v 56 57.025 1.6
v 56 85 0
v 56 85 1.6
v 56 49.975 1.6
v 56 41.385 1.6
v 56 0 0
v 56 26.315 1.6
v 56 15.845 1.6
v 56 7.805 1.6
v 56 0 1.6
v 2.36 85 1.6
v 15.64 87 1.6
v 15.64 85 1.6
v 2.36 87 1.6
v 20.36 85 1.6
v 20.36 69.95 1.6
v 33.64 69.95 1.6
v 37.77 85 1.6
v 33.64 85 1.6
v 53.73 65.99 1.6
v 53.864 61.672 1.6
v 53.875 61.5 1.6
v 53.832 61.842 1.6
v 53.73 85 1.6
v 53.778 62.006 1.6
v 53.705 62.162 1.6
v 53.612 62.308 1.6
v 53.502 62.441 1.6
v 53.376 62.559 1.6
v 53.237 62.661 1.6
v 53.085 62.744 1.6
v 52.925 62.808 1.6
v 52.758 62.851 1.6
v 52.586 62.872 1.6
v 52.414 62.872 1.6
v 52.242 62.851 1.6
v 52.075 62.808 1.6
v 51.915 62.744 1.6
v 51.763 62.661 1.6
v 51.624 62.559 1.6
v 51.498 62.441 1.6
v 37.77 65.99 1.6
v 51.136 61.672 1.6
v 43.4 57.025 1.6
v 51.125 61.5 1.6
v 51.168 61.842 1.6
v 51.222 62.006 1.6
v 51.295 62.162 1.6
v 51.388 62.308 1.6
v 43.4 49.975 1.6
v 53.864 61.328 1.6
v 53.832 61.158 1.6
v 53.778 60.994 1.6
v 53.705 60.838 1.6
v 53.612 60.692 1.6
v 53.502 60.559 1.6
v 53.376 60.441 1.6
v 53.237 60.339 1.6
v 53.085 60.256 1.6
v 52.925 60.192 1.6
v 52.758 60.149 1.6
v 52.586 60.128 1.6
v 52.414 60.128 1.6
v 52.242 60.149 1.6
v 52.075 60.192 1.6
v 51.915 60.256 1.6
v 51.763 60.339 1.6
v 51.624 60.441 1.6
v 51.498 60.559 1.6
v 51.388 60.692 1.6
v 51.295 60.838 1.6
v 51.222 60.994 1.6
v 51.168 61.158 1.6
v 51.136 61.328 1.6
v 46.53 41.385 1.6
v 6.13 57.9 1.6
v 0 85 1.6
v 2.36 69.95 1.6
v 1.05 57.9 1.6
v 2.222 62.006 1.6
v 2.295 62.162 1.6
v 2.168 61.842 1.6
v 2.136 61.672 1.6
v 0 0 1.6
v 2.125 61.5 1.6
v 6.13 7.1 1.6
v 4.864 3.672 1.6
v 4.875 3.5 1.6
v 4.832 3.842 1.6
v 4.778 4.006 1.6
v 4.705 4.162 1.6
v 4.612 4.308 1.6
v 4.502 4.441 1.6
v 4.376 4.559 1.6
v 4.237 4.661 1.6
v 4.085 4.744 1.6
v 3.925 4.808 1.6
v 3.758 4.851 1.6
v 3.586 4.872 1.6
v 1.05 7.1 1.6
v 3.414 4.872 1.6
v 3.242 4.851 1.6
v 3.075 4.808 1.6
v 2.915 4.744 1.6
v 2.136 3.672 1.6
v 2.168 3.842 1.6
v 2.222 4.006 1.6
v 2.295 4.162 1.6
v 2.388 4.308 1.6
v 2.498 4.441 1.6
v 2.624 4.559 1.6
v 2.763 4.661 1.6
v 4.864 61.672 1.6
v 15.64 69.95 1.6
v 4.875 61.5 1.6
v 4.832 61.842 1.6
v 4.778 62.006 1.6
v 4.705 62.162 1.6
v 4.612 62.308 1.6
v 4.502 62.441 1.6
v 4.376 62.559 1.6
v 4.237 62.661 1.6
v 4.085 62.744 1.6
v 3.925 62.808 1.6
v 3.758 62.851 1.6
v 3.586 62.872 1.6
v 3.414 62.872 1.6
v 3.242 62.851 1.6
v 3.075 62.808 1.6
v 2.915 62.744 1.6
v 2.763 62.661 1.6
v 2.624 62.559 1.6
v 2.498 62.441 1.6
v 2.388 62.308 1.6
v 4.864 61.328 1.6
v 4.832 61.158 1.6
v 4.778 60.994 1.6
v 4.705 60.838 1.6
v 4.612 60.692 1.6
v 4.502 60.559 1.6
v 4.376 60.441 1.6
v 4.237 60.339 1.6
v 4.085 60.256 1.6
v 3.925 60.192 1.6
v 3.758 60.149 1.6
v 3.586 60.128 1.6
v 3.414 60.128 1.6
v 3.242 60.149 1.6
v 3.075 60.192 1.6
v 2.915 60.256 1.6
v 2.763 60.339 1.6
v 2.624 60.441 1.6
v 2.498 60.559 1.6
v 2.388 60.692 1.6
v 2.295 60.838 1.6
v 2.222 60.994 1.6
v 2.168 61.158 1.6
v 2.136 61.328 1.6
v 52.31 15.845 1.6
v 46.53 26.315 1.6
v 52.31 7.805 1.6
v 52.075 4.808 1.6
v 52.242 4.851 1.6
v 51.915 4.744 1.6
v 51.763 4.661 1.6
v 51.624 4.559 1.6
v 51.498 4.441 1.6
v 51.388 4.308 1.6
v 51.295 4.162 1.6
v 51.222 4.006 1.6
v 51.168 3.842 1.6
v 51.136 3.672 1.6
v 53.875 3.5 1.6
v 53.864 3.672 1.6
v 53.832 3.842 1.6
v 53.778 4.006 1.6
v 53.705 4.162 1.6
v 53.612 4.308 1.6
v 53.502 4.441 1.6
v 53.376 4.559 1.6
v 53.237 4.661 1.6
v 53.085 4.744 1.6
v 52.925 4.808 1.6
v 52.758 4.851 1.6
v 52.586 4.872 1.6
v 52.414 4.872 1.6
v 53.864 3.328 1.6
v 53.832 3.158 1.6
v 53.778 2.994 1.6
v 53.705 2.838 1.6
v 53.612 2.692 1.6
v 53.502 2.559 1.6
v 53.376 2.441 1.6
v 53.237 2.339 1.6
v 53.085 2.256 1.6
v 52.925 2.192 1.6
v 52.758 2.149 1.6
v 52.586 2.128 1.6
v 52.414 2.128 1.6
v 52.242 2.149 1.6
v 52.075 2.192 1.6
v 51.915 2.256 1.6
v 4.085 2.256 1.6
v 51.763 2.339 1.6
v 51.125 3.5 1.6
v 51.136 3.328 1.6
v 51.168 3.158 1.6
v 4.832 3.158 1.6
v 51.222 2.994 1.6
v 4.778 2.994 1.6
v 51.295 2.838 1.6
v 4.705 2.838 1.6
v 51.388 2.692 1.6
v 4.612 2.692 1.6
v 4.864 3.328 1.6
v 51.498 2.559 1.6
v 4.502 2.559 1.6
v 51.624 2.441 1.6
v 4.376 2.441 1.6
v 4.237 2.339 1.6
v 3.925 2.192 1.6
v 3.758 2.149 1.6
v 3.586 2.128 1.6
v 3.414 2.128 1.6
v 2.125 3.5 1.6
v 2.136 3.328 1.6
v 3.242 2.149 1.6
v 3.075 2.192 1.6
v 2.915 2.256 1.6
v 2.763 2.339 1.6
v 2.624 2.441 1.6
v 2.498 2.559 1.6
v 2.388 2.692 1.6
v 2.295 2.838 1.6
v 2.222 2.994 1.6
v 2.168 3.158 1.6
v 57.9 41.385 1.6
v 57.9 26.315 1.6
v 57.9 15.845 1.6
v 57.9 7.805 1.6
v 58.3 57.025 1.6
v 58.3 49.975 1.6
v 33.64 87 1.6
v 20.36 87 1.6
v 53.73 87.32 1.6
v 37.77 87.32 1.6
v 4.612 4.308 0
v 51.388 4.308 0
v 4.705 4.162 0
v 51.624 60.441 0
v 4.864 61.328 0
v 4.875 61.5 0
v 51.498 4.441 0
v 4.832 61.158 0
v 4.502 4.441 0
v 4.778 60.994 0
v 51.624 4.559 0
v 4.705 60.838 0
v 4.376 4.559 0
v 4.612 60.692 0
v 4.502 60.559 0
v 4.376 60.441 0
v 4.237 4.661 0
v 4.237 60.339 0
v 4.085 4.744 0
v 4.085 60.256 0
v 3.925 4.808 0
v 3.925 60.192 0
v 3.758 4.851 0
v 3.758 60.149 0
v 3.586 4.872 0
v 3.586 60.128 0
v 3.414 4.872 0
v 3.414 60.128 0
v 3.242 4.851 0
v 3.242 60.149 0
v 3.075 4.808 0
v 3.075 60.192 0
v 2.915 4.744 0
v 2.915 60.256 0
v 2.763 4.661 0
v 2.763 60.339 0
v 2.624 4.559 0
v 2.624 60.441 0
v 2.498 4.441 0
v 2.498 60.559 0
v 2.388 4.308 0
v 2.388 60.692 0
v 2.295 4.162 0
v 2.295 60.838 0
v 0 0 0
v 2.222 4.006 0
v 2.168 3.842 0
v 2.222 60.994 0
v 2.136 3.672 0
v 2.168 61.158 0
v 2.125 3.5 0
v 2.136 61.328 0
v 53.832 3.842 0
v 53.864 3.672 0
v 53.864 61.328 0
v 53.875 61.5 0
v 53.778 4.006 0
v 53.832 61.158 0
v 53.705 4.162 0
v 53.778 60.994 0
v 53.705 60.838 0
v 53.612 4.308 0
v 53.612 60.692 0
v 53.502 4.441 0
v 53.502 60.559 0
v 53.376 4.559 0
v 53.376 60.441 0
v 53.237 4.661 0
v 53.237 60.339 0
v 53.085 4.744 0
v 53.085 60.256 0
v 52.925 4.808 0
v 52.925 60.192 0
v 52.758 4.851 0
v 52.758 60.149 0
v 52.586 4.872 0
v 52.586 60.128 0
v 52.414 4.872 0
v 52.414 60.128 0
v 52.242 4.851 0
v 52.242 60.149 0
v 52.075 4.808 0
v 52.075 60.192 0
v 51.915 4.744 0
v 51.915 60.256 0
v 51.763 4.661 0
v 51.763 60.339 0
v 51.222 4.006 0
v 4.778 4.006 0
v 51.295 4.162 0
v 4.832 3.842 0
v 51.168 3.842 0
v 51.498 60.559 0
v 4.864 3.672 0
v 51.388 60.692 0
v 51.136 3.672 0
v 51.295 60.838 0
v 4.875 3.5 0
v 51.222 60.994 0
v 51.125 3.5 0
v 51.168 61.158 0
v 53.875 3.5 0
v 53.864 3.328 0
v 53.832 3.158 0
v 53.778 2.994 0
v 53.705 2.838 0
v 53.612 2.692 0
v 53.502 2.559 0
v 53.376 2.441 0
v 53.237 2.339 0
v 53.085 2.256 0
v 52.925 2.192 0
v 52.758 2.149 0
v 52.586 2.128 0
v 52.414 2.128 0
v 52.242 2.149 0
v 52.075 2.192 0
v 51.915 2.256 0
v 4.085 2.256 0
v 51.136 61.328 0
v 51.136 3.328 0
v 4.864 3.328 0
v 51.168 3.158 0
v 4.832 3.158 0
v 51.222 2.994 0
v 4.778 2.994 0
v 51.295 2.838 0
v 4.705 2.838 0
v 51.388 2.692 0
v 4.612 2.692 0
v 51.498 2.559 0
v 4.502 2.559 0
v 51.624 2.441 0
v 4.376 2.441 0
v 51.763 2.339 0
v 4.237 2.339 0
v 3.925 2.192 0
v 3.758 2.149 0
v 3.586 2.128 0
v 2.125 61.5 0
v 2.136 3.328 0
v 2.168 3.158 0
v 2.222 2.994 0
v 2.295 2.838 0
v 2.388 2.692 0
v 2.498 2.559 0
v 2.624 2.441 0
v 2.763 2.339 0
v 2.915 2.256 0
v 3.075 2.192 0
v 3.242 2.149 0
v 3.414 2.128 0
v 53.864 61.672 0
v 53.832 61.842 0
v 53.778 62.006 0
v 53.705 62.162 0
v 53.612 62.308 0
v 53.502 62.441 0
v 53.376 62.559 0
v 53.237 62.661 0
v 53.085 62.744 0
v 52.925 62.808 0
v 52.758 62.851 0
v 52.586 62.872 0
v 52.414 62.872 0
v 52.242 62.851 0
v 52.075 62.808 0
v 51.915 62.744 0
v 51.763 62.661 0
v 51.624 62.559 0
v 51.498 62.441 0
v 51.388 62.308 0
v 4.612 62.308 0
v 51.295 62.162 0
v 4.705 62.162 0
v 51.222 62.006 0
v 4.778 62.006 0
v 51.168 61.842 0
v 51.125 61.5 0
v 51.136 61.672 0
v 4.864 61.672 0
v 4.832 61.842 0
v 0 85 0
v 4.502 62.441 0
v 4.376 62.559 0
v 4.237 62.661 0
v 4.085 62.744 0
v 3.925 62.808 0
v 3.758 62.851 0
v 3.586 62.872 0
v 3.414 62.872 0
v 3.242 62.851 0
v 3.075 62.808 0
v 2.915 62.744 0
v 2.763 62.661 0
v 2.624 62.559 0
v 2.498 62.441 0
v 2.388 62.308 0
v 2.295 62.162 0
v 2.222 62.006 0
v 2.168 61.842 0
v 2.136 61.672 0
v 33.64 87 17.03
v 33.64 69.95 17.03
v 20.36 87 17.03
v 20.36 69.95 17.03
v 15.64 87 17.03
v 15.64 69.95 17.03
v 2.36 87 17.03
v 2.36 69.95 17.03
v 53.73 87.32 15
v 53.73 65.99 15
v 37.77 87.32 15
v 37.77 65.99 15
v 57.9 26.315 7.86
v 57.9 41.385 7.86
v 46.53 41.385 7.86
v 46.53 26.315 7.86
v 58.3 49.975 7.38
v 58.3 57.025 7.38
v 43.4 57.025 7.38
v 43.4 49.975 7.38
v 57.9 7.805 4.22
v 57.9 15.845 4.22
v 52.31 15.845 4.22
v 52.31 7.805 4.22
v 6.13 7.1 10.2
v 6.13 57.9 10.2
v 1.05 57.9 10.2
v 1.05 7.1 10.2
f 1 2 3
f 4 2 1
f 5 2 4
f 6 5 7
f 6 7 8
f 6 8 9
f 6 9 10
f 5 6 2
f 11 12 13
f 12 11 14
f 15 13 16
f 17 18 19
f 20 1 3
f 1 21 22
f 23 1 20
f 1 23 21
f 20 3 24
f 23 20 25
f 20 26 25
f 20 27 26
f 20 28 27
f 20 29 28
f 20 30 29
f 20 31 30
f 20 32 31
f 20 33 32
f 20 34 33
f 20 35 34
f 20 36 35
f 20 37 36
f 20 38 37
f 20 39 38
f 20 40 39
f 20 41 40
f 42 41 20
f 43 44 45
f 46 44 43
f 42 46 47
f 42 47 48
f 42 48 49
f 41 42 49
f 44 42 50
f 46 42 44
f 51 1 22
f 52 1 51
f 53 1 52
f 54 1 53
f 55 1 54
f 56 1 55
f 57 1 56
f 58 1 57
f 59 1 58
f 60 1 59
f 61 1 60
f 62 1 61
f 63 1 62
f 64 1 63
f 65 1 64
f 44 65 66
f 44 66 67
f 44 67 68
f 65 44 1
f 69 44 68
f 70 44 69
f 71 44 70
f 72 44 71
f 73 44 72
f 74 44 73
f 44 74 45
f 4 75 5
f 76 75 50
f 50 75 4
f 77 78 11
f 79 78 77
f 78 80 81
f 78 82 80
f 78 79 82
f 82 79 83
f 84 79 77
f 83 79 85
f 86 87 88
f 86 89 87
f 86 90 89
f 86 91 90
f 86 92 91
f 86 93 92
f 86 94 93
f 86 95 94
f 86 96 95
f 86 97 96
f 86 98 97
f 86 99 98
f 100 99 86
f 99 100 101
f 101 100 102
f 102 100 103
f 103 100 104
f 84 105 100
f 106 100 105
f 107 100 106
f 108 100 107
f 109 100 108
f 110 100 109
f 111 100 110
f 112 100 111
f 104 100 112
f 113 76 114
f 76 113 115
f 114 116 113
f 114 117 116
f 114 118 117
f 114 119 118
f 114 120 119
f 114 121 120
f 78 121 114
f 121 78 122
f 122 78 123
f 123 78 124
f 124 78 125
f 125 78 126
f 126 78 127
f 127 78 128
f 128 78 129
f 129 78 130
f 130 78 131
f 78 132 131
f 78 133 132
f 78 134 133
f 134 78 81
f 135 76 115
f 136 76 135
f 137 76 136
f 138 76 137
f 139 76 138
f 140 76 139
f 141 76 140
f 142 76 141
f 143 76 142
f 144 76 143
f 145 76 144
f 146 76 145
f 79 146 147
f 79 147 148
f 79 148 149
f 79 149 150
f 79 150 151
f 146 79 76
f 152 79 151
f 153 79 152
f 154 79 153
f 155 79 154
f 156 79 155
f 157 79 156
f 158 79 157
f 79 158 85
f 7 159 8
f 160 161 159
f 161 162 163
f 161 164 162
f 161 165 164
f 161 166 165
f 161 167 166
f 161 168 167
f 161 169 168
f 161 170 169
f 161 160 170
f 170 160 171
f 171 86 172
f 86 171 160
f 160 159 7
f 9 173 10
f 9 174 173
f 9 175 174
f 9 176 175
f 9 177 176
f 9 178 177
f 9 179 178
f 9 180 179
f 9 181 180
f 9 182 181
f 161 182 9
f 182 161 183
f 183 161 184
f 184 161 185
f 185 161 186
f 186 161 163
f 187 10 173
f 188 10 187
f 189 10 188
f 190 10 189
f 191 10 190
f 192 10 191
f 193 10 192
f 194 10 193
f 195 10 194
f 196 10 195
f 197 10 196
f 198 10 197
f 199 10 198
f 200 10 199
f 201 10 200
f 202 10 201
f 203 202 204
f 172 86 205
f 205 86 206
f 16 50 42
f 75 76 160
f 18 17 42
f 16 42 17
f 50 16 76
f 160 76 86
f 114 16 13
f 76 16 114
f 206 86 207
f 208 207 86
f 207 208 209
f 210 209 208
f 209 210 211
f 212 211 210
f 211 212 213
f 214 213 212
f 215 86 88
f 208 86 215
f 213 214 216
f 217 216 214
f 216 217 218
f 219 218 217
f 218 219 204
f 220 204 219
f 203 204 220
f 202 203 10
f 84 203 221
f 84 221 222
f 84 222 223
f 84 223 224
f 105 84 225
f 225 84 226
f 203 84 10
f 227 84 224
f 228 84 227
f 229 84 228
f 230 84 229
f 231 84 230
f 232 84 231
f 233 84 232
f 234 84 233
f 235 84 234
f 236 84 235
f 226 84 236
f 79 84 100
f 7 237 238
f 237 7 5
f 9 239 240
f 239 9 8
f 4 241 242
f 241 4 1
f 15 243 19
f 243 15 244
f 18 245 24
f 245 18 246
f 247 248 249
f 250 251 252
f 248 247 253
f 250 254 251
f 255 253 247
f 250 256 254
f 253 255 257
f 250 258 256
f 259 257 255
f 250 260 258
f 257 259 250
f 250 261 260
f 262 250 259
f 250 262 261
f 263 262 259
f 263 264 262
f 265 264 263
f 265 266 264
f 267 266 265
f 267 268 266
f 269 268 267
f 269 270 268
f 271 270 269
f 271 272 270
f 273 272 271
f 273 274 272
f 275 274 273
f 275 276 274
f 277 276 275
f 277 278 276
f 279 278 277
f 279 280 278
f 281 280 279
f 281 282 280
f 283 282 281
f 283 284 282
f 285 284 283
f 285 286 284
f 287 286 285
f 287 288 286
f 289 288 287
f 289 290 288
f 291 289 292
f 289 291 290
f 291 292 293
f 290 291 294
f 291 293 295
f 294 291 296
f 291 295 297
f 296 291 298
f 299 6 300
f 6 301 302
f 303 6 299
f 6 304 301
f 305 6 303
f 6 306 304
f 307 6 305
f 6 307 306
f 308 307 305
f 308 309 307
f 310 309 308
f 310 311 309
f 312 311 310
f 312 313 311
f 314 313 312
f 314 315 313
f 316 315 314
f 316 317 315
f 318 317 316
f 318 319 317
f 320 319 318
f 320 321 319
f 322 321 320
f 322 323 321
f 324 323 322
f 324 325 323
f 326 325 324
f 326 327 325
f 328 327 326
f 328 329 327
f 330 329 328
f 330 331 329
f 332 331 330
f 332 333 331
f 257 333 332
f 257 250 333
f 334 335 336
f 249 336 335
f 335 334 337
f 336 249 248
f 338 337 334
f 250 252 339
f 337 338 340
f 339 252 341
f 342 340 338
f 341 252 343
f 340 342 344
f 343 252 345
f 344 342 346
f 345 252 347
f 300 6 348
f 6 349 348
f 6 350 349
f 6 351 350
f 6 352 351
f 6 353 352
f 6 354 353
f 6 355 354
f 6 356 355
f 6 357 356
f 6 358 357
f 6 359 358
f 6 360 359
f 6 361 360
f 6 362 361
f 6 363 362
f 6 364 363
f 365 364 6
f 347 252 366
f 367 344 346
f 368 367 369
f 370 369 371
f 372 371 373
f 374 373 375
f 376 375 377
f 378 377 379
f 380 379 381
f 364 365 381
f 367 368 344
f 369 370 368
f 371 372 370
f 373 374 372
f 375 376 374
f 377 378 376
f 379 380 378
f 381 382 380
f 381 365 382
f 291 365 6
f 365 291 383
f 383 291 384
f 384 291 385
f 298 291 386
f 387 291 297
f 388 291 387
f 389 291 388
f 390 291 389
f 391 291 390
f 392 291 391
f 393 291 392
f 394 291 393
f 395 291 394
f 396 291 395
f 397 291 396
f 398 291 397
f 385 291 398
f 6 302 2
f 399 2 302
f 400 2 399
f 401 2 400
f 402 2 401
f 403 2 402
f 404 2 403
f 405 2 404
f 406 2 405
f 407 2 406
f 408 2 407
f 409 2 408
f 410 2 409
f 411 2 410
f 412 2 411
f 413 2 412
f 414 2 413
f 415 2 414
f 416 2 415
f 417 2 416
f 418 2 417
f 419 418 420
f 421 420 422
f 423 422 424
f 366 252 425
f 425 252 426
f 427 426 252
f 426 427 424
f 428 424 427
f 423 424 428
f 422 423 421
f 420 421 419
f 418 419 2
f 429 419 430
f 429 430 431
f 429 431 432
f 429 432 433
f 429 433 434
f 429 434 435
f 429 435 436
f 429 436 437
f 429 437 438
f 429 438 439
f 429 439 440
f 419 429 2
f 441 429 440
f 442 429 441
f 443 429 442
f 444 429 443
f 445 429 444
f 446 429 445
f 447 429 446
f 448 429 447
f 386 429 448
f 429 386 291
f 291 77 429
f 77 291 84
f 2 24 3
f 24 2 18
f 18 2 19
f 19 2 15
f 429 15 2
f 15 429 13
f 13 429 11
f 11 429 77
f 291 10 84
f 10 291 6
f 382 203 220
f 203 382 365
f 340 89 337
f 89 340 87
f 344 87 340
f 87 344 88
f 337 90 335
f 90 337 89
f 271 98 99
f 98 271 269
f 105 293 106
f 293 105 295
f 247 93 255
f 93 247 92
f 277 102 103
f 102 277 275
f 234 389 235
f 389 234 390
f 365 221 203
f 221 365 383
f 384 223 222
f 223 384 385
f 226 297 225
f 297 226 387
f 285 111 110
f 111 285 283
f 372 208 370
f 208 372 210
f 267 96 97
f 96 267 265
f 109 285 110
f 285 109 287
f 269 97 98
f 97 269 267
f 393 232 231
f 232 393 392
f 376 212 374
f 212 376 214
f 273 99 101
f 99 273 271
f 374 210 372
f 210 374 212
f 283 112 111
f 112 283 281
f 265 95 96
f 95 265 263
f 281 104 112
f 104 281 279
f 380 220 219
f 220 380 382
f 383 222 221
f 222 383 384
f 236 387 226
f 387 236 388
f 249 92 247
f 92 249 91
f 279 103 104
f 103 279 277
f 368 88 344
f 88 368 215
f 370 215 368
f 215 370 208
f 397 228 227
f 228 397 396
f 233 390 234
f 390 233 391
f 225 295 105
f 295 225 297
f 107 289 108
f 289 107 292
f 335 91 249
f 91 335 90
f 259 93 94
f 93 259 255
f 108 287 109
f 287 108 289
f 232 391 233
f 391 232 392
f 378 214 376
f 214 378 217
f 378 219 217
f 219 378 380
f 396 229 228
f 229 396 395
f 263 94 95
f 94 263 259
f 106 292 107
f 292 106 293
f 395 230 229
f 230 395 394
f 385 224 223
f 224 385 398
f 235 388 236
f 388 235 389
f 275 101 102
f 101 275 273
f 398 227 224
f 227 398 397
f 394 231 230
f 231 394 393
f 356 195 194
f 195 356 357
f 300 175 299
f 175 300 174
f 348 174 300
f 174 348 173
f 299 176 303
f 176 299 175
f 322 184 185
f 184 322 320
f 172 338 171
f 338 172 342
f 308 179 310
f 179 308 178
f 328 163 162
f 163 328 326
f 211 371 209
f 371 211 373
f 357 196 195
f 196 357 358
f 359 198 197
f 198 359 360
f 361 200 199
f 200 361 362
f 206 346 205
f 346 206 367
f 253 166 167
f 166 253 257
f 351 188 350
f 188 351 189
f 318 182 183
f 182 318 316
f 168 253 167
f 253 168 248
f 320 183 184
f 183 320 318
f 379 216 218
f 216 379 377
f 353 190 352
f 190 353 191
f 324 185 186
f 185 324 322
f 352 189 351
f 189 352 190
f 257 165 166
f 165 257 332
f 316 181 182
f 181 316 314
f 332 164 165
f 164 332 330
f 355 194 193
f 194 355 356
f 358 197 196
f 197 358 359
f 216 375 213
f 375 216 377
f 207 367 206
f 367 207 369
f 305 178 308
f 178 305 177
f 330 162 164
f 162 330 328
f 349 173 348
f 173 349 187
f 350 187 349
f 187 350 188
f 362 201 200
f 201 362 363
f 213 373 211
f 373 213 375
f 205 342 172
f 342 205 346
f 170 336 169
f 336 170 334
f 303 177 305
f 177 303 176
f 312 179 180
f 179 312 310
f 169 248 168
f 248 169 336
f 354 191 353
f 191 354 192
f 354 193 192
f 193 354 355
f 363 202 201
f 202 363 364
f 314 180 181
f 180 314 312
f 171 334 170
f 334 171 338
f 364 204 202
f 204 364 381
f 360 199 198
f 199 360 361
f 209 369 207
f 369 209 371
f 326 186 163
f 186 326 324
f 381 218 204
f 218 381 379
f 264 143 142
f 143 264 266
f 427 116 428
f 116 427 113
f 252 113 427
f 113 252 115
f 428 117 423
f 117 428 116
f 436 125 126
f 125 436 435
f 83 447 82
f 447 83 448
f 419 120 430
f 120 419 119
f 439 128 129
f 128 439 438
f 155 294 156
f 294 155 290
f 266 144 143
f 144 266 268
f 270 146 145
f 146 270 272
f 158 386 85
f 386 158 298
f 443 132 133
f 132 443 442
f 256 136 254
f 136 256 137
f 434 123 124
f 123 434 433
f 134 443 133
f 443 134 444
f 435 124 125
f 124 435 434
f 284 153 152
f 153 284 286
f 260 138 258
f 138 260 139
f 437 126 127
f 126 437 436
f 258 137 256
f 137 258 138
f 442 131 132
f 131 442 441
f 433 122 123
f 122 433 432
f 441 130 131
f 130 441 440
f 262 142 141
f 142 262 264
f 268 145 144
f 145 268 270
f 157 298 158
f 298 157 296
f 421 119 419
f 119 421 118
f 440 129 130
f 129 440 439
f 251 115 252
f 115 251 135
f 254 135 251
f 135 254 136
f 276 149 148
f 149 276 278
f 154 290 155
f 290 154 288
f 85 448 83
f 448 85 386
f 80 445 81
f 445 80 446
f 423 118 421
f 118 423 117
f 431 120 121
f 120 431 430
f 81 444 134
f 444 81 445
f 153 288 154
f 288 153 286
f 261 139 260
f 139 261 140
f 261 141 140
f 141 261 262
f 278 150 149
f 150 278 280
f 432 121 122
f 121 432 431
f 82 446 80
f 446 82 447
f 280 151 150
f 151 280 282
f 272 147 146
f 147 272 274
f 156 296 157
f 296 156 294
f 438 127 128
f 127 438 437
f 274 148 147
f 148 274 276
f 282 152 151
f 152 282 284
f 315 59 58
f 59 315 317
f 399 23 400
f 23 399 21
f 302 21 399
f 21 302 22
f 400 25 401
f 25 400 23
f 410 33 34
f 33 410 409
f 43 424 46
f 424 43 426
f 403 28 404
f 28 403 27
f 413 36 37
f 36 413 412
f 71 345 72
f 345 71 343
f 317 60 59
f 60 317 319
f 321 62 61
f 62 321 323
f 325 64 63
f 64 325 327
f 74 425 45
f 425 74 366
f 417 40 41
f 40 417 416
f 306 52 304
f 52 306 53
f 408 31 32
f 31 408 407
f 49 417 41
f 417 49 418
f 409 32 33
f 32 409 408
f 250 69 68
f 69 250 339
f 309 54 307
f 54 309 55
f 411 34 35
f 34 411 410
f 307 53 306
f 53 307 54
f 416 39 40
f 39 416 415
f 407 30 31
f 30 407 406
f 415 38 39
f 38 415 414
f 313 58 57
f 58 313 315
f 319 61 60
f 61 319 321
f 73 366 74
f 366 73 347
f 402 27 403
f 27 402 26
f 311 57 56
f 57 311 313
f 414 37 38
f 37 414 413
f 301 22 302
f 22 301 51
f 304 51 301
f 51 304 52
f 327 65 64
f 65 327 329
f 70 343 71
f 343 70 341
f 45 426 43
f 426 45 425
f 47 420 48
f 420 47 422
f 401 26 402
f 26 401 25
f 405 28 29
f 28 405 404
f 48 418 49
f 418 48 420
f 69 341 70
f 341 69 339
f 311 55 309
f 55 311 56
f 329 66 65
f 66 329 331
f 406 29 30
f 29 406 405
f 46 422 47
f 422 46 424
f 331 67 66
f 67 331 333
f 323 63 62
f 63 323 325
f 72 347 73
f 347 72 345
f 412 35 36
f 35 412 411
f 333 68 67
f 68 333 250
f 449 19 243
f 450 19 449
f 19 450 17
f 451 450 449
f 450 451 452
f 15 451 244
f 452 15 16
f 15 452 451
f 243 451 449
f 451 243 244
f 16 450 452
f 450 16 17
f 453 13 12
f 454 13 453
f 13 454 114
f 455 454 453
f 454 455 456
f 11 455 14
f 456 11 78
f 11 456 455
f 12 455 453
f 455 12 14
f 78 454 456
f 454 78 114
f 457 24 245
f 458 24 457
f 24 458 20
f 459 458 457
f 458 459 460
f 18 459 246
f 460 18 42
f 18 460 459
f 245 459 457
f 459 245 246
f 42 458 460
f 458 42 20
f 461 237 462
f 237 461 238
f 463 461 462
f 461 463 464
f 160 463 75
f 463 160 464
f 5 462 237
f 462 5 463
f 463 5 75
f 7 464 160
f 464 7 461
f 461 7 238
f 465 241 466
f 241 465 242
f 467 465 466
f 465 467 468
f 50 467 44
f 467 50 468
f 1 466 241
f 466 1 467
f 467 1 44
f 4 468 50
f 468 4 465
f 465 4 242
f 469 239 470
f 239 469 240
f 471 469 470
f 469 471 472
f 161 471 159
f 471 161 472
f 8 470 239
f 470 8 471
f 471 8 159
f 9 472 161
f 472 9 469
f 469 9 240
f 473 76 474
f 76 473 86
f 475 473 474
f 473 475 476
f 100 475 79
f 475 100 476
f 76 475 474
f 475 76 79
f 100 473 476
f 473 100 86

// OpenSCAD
//
//RPI Shiled - RPi
//

piX=56;// RPi.png
piY=85;// RPi.png
piThick=1.60;// ?
piHoleDia=2.75;// RPi.png
piShieldLength=65;// RPi.png
HoleOffset=3.5;// RPi.png

usbWidth=13.28;
usbLength=17.05;
usbHeight=17.03-piThick;
usb1X=piX-29-usbWidth/2;// RPi.png
usb2X=piX-47-usbWidth/2;// RPi.png
usbOverHang=2;

ethWidth=15.96;
ethLength=21.33;
ethHeight=15.00-piThick;
ethX=piX-10.25-(ethWidth/2);// RPi.png
ethOverHang=2.32;

avWidth=7.05;
avLength=14.90;
avHeight=7.38-piThick;
avOverHang=2.30;
avY=53.5-avWidth/2;// RPi.png

hdmiWidth=11.37;
hdmiLength=15.07;
hdmiHeight=7.86-piThick;
hdmiOverHang=1.9;
hdmiY=32-(hdmiWidth/2);// RPi.png

microWidth=5.59;
microLength=8.04;
microHeight=4.22-piThick;
microOverHang=1.9;
microY=10.6-(microWidth/2);// RPi.png

gpioWidth=2.54*2;// pls.jpg
gpioLength=20*2.54;// pls.jpg
gpioHeight=6.10+2.5;// pls.jpg
gpioX=1.05;// ?
gpioY=HoleOffset+29-gpioLength/2;// RPi.png

$fn=50;

module pi_hole() {
	cylinder(h=piThick+2, d=piHoleDia);
}

module rpishield_rpi(edgeCut=0) {
	color("seagreen")
	difference() {
		cube([piX, piY, piThick]);
		translate([HoleOffset, HoleOffset, -1]) pi_hole();
		translate([piX-HoleOffset, HoleOffset, -1]) pi_hole();
		translate([HoleOffset, piShieldLength-HoleOffset, -1]) pi_hole();
		translate([piX-HoleOffset, piShieldLength-HoleOffset, -1]) pi_hole();
	}
	color("Silver") {
		// USB
		translate([usb1X, piY-usbLength+usbOverHang+edgeCut, piThick])
			cube([usbWidth, usbLength, usbHeight]);
		translate([usb2X, piY-usbLength+usbOverHang+edgeCut, piThick])
			cube([usbWidth, usbLength, usbHeight]);
		// ETH
		translate([ethX, piY-ethLength+ethOverHang+edgeCut, piThick])
			cube([ethWidth, ethLength, ethHeight]);
		// HDMI Plug
		translate([piX-hdmiWidth+hdmiOverHang+edgeCut, hdmiY, piThick])
			cube([hdmiWidth, hdmiLength, hdmiHeight]);
		// AV
		translate([piX-avLength+avOverHang+edgeCut, avY, piThick])
			cube([avLength, avWidth, avHeight]);
		// microUSB
		translate([piX-microWidth+microOverHang+edgeCut, microY, piThick])
			cube([microWidth, microLength, microHeight]);
	}
	// GPIO Headers
	color("black") {
		translate([gpioX, gpioY, piThick])
			cube([gpioWidth, gpioLength, gpioHeight]);
	}
}

rpishield_rpi();
